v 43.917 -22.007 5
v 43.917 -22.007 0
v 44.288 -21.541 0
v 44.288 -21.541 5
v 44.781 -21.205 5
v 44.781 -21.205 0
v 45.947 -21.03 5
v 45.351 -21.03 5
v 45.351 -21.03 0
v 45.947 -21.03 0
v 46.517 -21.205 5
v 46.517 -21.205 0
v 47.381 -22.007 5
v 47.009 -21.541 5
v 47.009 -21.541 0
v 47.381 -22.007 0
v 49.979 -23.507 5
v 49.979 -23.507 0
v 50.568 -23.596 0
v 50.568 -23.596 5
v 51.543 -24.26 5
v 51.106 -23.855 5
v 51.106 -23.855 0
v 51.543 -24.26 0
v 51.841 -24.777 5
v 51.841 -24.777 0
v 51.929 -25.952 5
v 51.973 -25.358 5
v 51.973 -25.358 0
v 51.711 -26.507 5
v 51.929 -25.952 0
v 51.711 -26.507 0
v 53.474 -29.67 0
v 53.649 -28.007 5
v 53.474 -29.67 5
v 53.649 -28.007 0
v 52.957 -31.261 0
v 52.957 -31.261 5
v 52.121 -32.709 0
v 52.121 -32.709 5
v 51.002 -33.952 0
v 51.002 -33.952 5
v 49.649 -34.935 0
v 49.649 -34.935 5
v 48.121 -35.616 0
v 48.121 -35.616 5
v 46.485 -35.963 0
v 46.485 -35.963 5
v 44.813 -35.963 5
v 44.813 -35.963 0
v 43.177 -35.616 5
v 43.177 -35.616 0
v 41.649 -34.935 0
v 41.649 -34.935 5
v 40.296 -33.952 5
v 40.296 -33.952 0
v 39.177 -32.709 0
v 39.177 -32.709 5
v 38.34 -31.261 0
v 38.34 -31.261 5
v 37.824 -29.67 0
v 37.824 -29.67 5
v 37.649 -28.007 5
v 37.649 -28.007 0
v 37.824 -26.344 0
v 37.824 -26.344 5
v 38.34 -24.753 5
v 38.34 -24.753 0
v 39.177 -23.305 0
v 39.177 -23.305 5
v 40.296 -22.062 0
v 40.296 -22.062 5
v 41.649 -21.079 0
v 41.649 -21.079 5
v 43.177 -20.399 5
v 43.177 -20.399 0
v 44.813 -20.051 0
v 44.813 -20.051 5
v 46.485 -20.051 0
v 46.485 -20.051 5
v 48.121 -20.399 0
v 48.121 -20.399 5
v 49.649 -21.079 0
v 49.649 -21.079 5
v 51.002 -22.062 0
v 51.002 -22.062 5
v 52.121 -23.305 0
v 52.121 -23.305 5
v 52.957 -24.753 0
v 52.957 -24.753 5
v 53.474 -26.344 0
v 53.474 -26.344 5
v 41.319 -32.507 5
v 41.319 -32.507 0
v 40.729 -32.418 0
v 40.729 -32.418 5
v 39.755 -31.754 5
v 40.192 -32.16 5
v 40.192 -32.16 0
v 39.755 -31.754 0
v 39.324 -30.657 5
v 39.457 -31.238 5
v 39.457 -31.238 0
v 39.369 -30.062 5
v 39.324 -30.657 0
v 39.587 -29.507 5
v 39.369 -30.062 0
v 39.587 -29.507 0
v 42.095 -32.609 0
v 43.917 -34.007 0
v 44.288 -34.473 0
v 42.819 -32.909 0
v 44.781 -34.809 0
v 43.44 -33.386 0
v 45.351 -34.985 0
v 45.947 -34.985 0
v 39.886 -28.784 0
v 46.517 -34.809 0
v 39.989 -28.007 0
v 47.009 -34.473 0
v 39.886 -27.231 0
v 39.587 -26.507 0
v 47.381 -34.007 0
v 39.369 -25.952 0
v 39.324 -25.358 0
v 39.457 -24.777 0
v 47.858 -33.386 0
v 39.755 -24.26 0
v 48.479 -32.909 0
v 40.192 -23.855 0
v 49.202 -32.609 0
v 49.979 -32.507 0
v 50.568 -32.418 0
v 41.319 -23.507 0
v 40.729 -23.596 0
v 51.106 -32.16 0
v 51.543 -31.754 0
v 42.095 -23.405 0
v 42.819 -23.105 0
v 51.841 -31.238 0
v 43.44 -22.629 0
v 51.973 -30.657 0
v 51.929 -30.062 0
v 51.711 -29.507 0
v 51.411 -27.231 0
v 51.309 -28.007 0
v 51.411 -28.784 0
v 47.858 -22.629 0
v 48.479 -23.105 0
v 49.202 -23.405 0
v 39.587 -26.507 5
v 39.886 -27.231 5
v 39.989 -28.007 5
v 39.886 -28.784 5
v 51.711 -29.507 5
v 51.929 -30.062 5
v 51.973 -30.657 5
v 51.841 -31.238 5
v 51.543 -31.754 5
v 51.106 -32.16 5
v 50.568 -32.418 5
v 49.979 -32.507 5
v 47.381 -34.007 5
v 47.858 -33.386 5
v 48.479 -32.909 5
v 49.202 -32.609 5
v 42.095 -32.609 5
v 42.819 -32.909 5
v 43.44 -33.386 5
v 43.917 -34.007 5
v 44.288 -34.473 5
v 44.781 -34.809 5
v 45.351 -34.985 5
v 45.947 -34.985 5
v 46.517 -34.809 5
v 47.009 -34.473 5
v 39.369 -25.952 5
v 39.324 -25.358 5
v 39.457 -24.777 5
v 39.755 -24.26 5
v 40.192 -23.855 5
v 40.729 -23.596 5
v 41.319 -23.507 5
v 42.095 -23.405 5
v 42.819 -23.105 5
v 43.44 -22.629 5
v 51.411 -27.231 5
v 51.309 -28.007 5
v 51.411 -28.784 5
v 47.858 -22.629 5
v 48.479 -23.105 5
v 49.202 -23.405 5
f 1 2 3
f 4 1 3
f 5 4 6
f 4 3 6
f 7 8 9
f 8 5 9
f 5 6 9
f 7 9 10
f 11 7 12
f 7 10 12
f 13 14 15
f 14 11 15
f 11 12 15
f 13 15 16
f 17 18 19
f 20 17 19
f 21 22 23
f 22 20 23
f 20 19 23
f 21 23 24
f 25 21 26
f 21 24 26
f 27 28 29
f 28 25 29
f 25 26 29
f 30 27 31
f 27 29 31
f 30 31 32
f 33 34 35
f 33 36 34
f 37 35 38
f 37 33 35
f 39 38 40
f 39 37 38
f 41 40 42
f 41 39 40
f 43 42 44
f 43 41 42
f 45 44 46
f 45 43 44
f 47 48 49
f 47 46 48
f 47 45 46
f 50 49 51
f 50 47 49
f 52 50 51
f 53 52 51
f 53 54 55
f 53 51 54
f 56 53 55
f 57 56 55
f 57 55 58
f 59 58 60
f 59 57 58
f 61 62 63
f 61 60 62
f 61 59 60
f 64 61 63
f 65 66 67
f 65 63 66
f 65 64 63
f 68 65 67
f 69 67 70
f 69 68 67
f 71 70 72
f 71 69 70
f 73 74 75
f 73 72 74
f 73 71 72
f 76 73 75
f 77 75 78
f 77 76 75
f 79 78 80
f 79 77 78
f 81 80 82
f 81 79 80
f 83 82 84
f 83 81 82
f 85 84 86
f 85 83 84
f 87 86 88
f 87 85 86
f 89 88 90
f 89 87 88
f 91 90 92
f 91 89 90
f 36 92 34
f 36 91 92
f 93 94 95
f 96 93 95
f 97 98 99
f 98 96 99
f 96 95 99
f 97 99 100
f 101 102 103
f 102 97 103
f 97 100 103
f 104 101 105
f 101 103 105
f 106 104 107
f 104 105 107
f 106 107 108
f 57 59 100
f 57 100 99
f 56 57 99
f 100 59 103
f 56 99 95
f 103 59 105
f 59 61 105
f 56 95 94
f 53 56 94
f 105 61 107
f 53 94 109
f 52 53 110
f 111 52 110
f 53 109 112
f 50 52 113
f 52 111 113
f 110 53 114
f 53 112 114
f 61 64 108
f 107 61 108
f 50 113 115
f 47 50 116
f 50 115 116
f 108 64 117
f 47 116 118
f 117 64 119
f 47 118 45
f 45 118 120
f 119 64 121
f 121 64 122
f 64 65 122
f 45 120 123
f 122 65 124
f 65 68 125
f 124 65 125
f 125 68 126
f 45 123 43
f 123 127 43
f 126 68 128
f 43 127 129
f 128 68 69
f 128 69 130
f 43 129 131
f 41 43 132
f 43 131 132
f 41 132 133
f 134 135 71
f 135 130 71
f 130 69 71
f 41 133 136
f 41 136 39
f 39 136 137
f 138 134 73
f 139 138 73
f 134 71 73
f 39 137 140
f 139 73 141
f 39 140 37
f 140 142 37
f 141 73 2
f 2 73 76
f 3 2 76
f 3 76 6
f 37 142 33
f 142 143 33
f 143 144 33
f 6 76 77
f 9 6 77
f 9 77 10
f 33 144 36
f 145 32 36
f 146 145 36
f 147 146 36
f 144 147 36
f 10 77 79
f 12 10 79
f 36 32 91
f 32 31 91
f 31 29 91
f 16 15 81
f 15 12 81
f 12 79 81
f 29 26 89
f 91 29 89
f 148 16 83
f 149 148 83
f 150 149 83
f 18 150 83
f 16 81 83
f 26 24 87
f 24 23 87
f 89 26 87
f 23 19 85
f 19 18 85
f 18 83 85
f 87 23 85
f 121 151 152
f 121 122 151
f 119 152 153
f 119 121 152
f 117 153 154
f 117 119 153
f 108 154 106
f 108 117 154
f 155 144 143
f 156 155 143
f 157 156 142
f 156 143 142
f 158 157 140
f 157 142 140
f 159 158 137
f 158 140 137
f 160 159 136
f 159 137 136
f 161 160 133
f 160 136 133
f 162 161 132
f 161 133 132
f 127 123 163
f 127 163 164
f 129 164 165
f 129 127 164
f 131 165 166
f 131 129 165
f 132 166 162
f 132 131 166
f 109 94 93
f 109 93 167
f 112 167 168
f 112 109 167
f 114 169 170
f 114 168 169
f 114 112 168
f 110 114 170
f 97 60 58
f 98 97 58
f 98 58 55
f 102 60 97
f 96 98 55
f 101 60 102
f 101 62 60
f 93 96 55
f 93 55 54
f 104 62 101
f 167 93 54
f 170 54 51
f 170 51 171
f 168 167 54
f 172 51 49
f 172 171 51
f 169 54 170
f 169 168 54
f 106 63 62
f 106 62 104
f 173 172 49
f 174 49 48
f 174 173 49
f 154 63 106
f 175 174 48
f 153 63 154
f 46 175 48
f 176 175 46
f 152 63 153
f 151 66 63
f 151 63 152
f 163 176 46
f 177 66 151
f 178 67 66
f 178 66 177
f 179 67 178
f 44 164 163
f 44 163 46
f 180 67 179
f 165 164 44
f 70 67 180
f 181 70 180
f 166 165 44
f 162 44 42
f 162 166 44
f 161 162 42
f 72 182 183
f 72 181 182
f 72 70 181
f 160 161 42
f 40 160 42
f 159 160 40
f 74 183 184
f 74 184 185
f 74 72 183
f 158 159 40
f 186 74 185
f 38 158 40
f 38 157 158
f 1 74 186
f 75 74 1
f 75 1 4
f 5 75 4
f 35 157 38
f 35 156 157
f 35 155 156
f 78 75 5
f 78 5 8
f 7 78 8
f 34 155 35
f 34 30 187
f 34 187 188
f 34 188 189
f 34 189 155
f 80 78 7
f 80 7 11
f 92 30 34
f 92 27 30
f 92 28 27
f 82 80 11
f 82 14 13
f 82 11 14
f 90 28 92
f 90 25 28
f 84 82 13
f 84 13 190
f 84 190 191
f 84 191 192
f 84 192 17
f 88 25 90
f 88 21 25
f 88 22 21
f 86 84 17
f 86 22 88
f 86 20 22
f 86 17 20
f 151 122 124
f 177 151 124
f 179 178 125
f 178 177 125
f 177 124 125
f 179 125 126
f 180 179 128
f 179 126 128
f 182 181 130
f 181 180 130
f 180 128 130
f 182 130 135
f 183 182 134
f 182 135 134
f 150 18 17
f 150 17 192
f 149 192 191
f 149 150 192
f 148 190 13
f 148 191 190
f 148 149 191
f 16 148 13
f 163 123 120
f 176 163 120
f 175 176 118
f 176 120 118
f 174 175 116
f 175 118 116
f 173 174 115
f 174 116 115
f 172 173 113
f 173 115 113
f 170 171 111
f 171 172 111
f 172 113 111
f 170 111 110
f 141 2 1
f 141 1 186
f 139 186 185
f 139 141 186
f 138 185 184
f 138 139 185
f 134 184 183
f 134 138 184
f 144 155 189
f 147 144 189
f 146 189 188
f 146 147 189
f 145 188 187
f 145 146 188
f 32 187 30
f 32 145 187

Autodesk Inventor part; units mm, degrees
ref_plane "YZ Plane" through (0, 0, 0) normal (1, 0, 0) x (0, 1, 0)
ref_plane "XZ Plane" through (0, 0, 0) normal (0, 1, 0) x (-1, 0, 0)
ref_plane "XY Plane" through (0, 0, 0) normal (0, 0, 1) x (1, 0, 0)
sketch "スケッチ1" plane through (0, 0, 0) normal (0, 0, 1) x (1, 0, 0)
  circle A0 centre (45.6488, -28.0072) radius 8
  circle A1 centre (45.6488, -28.0072) radius 7 construction
  line L0 (45.6488, -21.0072) -> (51.7109, -24.5072) construction
  line L1 (51.7109, -24.5072) -> (51.7109, -31.5072) construction
  line L2 (51.7109, -31.5072) -> (45.6488, -35.0072) construction
  line L3 (45.6488, -35.0072) -> (39.5866, -31.5072) construction
  line L4 (39.5866, -31.5072) -> (39.5866, -24.5072) construction
  line L5 (39.5866, -24.5072) -> (45.6488, -21.0072) construction
  arc A2 (47.3808, -22.0072) -> (43.9167, -22.0072) centre (45.6488, -23.0072) ccw
  arc A3 (41.3186, -23.5072) -> (39.5866, -26.5072) centre (41.3186, -25.5072) ccw
  arc A4 (39.5866, -29.5072) -> (41.3186, -32.5072) centre (41.3186, -30.5072) ccw
  arc A5 (43.9167, -34.0072) -> (47.3808, -34.0072) centre (45.6488, -33.0072) ccw
  arc A6 (49.9789, -32.5072) -> (51.7109, -29.5072) centre (49.9789, -30.5072) ccw
  arc A7 (51.7109, -26.5072) -> (49.9789, -23.5072) centre (49.9789, -25.5072) ccw
  arc A8 (47.3808, -22.0072) -> (49.9789, -23.5072) centre (49.9789, -20.5072) ccw
  arc A9 (41.3186, -23.5072) -> (43.9167, -22.0072) centre (41.3186, -20.5072) ccw
  arc A10 (39.5866, -29.5072) -> (39.5866, -26.5072) centre (36.9885, -28.0072) ccw
  arc A11 (43.9167, -34.0072) -> (41.3186, -32.5072) centre (41.3186, -35.5072) ccw
  arc A12 (49.9789, -32.5072) -> (47.3808, -34.0072) centre (49.9789, -35.5072) ccw
  arc A13 (51.7109, -26.5072) -> (51.7109, -29.5072) centre (54.309, -28.0072) ccw
  circle A14 centre (45.6488, -28.0072) radius 5.6603 construction
  point P0 (0, 0)
  point P1 (51.7109, -31.5072)
  point P2 (51.7109, -24.5072)
  point P3 (39.5866, -26.5072)
  point P4 (41.3186, -23.5072)
  point P5 (43.9167, -22.0072)
  point P6 (51.7109, -26.5072)
  dimension "d5" = 14
  dimension "d4" = 16
  dimension "d6" = 360
  dimension "d7" = 360
  dimension "d8" = 11.3205
  dimension "d9" = 3
  dimension "d10" = 2
extrude "押し出し1" add sketch "スケッチ1" along normal blind 5
properties part number "1ギア接続部外" material "アルミニウム 2014-T4"
